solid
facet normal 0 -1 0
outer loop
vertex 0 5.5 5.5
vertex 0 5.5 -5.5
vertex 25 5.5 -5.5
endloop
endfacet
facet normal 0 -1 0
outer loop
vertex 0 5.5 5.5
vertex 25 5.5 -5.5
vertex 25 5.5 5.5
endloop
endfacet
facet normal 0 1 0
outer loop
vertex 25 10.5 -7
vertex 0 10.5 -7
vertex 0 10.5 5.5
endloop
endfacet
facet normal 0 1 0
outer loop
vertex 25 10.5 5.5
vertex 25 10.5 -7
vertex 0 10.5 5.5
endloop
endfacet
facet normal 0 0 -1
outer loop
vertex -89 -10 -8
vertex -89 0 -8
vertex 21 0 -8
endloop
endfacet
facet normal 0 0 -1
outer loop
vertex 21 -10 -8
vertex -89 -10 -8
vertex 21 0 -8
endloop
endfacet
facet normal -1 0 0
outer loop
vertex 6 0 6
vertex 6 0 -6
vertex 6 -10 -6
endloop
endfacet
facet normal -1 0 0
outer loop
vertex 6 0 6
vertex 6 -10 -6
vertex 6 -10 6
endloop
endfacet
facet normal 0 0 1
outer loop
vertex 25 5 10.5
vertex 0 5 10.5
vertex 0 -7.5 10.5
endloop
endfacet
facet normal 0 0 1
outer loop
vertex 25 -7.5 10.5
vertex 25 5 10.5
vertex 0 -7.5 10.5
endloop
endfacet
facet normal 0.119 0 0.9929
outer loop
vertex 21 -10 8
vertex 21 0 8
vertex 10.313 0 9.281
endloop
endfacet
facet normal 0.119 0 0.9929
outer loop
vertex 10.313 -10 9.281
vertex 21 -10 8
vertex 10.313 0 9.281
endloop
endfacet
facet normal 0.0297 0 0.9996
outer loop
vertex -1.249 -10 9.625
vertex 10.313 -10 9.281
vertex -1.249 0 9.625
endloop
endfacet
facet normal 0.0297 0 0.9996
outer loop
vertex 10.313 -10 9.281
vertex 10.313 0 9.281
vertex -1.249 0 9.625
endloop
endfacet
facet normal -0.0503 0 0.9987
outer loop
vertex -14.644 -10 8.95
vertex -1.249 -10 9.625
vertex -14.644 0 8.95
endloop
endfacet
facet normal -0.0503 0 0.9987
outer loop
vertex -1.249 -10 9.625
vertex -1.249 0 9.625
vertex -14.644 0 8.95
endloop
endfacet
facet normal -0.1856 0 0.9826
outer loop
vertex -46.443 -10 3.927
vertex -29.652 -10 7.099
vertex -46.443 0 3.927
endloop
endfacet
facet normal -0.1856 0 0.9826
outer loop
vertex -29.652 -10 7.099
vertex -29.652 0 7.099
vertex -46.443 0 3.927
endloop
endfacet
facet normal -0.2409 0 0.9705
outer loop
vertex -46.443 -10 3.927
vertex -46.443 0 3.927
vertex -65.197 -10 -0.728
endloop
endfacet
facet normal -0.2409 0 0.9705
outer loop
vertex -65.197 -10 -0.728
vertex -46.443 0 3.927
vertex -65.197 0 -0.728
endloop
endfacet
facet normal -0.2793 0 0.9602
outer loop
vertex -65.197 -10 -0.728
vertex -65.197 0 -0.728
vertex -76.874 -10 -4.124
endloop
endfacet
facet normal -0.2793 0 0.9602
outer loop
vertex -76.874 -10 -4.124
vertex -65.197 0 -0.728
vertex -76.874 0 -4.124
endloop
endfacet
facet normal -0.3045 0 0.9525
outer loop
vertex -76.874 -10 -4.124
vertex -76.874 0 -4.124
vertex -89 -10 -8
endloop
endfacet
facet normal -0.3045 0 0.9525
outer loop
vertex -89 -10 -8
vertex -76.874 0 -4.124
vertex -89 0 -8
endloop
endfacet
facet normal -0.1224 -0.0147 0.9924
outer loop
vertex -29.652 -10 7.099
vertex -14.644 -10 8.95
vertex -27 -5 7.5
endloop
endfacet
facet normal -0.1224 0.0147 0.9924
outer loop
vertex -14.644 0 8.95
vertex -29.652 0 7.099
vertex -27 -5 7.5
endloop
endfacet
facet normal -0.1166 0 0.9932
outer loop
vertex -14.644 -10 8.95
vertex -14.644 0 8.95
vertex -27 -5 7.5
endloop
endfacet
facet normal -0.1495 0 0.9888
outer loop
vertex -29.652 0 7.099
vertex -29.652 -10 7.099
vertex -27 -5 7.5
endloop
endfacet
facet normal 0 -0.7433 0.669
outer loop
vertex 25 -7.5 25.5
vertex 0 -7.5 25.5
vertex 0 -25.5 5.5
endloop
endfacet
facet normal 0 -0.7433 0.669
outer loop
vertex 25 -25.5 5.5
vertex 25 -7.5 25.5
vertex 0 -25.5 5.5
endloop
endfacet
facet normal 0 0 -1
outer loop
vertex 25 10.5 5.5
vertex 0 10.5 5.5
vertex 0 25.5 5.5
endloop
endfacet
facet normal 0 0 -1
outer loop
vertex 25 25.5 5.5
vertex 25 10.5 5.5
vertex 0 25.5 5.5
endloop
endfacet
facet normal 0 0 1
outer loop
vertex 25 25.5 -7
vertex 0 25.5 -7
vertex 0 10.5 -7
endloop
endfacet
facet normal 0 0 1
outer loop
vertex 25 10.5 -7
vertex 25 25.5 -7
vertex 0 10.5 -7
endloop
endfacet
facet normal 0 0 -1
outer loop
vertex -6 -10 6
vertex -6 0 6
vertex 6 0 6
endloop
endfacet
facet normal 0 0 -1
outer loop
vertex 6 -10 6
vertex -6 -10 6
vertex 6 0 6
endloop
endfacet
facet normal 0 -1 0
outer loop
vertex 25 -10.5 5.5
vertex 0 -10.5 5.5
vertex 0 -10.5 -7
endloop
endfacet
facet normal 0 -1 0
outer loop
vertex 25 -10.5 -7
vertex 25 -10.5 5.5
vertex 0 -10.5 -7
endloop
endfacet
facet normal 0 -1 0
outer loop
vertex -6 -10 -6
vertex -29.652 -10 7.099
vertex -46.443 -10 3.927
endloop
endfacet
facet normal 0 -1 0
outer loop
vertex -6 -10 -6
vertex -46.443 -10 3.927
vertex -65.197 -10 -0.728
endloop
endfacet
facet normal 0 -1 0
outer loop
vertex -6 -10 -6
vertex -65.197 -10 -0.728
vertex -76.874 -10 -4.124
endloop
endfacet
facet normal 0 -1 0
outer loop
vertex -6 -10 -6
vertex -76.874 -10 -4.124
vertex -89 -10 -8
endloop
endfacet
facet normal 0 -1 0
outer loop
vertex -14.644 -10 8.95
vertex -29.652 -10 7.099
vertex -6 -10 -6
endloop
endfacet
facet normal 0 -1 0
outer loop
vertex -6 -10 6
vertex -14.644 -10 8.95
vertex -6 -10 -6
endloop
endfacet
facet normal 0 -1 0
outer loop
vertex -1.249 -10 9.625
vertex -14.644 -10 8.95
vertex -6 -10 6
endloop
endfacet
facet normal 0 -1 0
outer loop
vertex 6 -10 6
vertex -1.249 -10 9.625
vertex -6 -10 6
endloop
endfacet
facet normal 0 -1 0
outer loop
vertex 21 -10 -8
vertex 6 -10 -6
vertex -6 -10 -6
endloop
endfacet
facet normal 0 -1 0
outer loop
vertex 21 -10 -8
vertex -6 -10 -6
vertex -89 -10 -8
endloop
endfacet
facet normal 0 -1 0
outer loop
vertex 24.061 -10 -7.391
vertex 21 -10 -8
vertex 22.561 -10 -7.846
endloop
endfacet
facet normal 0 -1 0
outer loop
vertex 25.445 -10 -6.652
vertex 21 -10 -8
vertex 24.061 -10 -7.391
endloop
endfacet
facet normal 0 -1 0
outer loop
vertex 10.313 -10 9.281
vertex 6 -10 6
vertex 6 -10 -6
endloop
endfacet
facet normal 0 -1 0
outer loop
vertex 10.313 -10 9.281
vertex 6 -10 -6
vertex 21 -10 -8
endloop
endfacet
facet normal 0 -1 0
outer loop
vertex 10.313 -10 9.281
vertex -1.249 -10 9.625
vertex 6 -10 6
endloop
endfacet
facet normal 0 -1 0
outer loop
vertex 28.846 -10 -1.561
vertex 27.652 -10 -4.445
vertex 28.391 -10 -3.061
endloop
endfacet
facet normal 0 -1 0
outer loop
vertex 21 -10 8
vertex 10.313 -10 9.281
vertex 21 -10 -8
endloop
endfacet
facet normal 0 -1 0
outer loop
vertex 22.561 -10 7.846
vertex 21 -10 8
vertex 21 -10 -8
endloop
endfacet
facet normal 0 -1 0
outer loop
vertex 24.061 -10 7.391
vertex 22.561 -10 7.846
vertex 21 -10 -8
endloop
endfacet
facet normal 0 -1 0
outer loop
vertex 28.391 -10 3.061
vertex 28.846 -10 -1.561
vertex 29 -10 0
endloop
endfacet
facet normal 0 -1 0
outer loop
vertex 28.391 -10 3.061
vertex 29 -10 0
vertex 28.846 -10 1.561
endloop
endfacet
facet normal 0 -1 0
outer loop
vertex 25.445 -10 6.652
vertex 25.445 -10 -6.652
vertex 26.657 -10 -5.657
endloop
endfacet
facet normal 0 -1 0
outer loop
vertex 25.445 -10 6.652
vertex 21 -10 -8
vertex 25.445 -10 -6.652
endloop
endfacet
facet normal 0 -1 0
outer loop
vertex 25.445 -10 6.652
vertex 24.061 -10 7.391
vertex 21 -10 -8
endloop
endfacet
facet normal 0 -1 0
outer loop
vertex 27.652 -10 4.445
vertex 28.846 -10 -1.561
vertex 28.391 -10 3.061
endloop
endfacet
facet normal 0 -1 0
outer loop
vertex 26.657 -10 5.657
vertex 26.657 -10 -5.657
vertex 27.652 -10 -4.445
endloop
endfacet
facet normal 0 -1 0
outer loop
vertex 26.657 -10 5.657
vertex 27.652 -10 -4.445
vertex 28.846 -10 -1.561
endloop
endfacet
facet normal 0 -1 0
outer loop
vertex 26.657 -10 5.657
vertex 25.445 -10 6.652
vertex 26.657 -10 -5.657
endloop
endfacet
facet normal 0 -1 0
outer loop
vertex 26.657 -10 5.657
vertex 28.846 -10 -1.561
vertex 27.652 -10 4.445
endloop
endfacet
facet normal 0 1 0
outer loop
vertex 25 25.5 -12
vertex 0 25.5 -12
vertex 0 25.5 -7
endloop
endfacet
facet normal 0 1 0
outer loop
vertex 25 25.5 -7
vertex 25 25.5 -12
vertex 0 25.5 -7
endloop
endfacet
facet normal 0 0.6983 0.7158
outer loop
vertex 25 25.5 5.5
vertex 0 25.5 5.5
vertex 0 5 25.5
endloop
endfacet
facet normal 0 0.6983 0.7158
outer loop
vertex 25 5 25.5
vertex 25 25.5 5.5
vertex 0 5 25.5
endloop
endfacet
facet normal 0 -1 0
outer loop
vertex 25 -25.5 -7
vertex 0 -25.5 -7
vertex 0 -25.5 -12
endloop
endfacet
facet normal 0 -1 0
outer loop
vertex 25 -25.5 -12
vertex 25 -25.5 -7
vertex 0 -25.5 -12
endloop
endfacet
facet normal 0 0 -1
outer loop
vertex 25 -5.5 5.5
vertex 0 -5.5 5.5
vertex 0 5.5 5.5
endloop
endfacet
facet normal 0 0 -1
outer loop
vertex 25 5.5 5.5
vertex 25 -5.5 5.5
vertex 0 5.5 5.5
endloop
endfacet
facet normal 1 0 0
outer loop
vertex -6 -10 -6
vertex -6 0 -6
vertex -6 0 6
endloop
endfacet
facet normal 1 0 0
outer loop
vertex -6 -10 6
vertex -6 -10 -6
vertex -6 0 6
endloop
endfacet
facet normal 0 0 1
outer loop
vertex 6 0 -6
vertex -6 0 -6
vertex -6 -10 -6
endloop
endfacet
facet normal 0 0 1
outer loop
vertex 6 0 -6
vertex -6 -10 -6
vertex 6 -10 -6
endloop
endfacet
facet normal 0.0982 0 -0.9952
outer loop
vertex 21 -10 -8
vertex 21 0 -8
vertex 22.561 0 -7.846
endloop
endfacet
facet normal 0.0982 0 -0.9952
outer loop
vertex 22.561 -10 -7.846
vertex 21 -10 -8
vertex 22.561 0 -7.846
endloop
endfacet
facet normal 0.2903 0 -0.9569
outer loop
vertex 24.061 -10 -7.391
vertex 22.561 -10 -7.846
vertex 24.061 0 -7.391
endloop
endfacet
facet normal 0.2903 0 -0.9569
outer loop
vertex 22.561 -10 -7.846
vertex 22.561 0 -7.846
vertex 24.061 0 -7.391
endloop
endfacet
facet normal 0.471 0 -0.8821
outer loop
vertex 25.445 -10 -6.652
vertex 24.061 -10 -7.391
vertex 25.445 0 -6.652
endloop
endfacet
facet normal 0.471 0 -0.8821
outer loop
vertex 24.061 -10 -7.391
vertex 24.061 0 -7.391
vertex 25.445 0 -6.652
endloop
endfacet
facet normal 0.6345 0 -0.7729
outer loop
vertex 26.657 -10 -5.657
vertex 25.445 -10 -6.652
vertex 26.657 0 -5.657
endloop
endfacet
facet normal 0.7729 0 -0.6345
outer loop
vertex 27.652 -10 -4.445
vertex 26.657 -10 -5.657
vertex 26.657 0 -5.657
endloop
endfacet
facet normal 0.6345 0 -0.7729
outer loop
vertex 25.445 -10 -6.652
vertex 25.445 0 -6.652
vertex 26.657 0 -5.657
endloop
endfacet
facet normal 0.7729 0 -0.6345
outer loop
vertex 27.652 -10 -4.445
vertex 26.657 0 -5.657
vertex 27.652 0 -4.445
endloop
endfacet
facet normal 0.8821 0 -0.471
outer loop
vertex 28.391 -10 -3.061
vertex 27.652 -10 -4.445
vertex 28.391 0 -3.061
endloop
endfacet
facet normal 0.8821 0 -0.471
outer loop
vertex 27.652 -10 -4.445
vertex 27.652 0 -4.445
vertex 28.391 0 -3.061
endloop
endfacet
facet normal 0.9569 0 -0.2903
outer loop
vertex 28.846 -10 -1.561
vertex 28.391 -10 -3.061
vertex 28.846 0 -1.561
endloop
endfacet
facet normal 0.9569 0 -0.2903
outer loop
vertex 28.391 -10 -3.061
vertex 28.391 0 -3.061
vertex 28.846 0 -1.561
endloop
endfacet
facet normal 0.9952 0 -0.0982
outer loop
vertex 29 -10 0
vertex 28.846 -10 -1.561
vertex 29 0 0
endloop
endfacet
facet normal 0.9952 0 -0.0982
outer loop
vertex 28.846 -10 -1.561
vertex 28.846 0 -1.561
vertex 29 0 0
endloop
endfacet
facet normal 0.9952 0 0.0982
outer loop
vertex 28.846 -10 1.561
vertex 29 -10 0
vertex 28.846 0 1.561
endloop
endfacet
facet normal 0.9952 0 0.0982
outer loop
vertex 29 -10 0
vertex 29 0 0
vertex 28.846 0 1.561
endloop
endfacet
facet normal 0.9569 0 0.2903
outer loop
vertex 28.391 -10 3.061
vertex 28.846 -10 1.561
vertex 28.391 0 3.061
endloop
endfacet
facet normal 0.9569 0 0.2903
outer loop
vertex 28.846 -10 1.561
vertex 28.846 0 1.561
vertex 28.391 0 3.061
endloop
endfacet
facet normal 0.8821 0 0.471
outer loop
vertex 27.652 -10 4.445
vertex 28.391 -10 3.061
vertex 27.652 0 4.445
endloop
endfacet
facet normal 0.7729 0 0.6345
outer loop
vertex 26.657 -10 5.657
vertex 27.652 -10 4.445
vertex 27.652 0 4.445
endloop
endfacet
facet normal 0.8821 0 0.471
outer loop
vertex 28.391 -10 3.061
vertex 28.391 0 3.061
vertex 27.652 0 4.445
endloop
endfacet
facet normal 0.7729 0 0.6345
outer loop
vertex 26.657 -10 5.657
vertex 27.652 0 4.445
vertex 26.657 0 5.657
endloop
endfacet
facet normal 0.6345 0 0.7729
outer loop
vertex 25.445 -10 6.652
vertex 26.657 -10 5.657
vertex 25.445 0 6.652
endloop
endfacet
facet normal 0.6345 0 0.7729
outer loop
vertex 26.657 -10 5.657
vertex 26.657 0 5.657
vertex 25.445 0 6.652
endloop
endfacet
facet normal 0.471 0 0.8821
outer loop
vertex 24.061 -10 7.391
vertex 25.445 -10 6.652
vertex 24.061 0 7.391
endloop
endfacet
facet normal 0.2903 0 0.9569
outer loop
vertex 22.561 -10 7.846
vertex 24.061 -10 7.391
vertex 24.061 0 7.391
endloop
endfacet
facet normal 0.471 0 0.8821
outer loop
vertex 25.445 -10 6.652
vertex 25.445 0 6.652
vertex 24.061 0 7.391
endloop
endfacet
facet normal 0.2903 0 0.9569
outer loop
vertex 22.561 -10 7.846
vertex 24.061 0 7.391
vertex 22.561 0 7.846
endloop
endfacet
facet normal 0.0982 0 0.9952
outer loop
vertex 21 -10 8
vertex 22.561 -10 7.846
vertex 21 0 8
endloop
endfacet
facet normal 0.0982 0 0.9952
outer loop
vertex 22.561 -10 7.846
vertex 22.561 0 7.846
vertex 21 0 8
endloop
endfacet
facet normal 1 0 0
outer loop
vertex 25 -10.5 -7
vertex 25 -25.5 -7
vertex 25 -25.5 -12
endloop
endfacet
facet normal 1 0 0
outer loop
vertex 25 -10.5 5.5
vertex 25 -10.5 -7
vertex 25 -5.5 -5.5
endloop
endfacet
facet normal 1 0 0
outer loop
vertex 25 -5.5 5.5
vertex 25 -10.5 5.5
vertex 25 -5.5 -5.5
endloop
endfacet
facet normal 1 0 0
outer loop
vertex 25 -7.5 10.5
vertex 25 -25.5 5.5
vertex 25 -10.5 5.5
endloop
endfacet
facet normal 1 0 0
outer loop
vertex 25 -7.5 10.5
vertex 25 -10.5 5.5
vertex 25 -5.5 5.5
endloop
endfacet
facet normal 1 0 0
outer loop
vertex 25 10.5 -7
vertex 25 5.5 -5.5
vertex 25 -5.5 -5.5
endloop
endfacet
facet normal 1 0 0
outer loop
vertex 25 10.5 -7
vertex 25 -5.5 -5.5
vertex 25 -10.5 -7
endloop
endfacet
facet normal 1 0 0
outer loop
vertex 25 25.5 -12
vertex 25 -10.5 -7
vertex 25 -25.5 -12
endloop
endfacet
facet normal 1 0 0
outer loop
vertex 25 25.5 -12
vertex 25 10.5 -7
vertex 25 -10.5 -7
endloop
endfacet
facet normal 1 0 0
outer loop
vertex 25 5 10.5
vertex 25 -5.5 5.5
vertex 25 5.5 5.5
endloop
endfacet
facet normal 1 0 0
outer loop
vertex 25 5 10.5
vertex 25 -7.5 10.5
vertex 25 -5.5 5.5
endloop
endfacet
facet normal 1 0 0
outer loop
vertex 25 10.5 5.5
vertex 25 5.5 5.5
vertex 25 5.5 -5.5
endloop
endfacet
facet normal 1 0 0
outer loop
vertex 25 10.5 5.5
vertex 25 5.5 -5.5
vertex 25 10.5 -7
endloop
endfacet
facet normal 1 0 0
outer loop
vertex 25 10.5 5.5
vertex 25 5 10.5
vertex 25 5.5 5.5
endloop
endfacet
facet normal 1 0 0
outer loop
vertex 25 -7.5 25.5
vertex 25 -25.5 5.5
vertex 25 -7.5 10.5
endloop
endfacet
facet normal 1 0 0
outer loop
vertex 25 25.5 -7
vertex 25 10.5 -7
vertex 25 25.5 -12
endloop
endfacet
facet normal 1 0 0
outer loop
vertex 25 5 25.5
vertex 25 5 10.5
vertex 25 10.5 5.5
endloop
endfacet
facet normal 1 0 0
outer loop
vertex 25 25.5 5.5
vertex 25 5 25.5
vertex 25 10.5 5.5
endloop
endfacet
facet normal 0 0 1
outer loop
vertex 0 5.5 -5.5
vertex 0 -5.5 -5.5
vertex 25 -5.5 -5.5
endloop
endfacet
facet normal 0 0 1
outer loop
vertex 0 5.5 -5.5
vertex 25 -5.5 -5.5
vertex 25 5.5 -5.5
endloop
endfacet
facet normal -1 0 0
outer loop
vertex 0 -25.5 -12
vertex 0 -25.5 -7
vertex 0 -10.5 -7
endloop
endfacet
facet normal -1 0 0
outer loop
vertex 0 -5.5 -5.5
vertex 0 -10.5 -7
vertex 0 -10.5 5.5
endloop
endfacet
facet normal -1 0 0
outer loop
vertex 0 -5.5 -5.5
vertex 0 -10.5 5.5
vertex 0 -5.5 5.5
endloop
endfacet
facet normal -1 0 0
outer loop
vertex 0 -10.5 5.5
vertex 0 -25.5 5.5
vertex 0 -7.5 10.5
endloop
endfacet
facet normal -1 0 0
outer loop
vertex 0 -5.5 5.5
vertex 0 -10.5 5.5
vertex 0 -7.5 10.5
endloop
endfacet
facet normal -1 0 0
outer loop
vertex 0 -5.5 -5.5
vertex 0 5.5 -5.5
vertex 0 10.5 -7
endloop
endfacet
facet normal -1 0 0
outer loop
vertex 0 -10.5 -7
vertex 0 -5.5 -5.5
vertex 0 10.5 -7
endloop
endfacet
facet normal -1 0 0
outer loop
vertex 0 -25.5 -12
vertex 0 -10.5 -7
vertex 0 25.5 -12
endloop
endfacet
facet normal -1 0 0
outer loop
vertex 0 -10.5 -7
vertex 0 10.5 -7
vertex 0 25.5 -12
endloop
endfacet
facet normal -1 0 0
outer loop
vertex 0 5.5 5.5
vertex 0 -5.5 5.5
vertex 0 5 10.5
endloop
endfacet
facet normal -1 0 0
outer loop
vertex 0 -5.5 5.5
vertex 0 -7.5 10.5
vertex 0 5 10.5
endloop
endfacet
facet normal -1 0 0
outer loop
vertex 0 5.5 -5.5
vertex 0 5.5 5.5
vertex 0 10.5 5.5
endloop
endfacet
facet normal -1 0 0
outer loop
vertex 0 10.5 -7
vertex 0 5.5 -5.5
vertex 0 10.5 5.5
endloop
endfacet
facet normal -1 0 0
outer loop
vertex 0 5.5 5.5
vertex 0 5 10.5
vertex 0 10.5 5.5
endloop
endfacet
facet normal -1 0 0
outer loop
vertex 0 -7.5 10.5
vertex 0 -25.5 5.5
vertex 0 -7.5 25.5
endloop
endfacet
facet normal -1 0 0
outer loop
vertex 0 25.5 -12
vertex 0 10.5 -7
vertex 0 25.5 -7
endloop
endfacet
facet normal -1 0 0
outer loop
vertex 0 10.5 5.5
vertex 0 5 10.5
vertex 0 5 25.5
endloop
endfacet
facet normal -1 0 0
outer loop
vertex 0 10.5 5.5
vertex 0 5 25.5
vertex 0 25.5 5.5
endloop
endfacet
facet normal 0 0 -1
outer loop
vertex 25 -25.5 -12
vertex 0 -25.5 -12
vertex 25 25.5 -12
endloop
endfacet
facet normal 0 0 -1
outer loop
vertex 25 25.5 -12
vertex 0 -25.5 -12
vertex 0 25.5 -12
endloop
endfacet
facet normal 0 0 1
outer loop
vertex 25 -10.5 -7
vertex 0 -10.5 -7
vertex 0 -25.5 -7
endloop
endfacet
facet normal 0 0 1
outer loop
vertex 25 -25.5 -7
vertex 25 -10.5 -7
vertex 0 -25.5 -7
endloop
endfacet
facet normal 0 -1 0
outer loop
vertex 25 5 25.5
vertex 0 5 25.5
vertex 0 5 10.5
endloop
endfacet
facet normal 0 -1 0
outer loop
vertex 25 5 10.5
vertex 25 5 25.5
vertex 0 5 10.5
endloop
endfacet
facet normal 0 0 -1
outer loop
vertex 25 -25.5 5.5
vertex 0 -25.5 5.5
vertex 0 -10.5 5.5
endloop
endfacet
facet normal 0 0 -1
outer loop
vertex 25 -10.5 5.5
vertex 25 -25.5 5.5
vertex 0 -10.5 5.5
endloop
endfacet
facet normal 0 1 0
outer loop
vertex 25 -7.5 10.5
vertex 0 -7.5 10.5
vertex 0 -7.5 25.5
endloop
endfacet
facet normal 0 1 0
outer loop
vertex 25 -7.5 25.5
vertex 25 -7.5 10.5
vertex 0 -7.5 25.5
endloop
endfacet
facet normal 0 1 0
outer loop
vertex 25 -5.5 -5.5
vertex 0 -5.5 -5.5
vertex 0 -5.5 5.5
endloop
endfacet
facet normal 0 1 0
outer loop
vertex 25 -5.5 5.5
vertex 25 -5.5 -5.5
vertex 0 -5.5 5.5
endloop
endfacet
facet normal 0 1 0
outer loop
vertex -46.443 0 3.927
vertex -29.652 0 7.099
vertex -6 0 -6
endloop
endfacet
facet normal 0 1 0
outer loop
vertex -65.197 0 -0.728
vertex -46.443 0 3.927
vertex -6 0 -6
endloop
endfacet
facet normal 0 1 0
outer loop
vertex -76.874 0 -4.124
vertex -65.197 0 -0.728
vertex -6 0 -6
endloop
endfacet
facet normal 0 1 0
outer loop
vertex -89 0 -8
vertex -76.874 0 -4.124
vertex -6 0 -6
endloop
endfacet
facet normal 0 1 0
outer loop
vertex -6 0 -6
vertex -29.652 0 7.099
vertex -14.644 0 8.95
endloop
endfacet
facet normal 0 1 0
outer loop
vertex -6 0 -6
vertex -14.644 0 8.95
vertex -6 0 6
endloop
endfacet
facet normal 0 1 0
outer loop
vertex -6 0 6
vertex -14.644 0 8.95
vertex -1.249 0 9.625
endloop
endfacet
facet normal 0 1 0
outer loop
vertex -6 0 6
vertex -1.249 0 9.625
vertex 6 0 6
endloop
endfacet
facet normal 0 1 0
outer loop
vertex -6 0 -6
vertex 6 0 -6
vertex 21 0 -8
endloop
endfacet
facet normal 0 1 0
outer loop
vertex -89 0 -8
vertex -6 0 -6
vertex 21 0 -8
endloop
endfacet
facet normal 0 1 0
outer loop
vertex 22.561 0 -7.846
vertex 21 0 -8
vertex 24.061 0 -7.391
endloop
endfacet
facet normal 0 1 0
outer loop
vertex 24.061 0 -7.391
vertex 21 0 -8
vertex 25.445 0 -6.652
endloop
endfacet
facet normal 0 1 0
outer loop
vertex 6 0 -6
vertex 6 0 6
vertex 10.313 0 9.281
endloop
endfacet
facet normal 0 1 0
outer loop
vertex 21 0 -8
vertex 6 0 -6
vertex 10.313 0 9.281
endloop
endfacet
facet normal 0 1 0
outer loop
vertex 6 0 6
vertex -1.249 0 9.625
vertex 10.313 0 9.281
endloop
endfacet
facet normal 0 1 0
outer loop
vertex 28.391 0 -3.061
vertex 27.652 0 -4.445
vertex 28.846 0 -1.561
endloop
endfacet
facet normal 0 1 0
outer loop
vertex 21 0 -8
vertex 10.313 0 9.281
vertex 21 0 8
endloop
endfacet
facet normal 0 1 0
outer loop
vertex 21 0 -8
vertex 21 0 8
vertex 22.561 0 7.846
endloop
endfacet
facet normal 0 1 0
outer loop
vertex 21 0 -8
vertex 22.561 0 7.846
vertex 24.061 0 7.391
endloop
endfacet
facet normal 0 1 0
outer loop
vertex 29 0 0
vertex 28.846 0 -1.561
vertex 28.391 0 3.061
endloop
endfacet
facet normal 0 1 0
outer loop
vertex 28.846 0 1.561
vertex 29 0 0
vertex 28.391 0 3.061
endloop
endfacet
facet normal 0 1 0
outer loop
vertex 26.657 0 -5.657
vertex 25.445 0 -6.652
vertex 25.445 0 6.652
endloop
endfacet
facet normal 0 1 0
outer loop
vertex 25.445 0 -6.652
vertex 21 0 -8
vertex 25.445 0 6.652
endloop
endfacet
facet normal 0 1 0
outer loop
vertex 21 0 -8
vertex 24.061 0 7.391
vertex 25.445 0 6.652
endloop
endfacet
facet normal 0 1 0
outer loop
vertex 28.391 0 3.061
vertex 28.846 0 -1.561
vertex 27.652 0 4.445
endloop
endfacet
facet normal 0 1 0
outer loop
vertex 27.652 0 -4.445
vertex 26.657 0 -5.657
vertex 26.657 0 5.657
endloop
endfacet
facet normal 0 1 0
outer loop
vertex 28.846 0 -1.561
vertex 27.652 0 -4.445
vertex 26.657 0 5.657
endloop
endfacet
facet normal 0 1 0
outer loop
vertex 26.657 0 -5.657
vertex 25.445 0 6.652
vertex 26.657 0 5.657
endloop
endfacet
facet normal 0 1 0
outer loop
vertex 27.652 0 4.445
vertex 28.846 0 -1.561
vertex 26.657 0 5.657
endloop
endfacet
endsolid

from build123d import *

# Parameters (mm, degrees)
SKETCH_W     = 12
SKETCH_H     = 12
PAD_DEPTH    = 10
SKETCH001_W  = 11
SKETCH001_H  = 11
PAD001_DEPTH = 25


with BuildPart() as wingrib:
    # Sketch → Pad (new body)
    with BuildSketch(Plane.XZ):
        with BuildLine():
            Line((-89, -8), (21, -8))
            ThreePointArc((21, -8), (29.000033, 0), (21, 8))
            add(Edge.make_bspline(
                [(21, 8), (-20, 15), (-89, -8)],
                knots=[0, 0, 0, 1, 1, 1], degree=2))
        make_face()
        Rectangle(SKETCH_W, SKETCH_H, mode=Mode.SUBTRACT)
    extrude(amount=PAD_DEPTH)


with BuildPart() as tailmount:
    # Sketch001 → Pad001 (new body)
    with BuildSketch(Plane.YZ):
        Polygon((10.5, 5.5), (25.5, 5.5), (5, 25.5), (5, 10.5), (-7.5, 10.5), (-7.5, 25.5), (-25.5, 5.5), (-10.5, 5.5), (-10.5, -7), (-25.5, -7), (-25.5, -12), (25.5, -12), (25.5, -7), (10.5, -7), align=None)
        Rectangle(SKETCH001_W, SKETCH001_H, mode=Mode.SUBTRACT)
    extrude(amount=PAD001_DEPTH)


solid = Compound([wingrib.part, tailmount.part])
